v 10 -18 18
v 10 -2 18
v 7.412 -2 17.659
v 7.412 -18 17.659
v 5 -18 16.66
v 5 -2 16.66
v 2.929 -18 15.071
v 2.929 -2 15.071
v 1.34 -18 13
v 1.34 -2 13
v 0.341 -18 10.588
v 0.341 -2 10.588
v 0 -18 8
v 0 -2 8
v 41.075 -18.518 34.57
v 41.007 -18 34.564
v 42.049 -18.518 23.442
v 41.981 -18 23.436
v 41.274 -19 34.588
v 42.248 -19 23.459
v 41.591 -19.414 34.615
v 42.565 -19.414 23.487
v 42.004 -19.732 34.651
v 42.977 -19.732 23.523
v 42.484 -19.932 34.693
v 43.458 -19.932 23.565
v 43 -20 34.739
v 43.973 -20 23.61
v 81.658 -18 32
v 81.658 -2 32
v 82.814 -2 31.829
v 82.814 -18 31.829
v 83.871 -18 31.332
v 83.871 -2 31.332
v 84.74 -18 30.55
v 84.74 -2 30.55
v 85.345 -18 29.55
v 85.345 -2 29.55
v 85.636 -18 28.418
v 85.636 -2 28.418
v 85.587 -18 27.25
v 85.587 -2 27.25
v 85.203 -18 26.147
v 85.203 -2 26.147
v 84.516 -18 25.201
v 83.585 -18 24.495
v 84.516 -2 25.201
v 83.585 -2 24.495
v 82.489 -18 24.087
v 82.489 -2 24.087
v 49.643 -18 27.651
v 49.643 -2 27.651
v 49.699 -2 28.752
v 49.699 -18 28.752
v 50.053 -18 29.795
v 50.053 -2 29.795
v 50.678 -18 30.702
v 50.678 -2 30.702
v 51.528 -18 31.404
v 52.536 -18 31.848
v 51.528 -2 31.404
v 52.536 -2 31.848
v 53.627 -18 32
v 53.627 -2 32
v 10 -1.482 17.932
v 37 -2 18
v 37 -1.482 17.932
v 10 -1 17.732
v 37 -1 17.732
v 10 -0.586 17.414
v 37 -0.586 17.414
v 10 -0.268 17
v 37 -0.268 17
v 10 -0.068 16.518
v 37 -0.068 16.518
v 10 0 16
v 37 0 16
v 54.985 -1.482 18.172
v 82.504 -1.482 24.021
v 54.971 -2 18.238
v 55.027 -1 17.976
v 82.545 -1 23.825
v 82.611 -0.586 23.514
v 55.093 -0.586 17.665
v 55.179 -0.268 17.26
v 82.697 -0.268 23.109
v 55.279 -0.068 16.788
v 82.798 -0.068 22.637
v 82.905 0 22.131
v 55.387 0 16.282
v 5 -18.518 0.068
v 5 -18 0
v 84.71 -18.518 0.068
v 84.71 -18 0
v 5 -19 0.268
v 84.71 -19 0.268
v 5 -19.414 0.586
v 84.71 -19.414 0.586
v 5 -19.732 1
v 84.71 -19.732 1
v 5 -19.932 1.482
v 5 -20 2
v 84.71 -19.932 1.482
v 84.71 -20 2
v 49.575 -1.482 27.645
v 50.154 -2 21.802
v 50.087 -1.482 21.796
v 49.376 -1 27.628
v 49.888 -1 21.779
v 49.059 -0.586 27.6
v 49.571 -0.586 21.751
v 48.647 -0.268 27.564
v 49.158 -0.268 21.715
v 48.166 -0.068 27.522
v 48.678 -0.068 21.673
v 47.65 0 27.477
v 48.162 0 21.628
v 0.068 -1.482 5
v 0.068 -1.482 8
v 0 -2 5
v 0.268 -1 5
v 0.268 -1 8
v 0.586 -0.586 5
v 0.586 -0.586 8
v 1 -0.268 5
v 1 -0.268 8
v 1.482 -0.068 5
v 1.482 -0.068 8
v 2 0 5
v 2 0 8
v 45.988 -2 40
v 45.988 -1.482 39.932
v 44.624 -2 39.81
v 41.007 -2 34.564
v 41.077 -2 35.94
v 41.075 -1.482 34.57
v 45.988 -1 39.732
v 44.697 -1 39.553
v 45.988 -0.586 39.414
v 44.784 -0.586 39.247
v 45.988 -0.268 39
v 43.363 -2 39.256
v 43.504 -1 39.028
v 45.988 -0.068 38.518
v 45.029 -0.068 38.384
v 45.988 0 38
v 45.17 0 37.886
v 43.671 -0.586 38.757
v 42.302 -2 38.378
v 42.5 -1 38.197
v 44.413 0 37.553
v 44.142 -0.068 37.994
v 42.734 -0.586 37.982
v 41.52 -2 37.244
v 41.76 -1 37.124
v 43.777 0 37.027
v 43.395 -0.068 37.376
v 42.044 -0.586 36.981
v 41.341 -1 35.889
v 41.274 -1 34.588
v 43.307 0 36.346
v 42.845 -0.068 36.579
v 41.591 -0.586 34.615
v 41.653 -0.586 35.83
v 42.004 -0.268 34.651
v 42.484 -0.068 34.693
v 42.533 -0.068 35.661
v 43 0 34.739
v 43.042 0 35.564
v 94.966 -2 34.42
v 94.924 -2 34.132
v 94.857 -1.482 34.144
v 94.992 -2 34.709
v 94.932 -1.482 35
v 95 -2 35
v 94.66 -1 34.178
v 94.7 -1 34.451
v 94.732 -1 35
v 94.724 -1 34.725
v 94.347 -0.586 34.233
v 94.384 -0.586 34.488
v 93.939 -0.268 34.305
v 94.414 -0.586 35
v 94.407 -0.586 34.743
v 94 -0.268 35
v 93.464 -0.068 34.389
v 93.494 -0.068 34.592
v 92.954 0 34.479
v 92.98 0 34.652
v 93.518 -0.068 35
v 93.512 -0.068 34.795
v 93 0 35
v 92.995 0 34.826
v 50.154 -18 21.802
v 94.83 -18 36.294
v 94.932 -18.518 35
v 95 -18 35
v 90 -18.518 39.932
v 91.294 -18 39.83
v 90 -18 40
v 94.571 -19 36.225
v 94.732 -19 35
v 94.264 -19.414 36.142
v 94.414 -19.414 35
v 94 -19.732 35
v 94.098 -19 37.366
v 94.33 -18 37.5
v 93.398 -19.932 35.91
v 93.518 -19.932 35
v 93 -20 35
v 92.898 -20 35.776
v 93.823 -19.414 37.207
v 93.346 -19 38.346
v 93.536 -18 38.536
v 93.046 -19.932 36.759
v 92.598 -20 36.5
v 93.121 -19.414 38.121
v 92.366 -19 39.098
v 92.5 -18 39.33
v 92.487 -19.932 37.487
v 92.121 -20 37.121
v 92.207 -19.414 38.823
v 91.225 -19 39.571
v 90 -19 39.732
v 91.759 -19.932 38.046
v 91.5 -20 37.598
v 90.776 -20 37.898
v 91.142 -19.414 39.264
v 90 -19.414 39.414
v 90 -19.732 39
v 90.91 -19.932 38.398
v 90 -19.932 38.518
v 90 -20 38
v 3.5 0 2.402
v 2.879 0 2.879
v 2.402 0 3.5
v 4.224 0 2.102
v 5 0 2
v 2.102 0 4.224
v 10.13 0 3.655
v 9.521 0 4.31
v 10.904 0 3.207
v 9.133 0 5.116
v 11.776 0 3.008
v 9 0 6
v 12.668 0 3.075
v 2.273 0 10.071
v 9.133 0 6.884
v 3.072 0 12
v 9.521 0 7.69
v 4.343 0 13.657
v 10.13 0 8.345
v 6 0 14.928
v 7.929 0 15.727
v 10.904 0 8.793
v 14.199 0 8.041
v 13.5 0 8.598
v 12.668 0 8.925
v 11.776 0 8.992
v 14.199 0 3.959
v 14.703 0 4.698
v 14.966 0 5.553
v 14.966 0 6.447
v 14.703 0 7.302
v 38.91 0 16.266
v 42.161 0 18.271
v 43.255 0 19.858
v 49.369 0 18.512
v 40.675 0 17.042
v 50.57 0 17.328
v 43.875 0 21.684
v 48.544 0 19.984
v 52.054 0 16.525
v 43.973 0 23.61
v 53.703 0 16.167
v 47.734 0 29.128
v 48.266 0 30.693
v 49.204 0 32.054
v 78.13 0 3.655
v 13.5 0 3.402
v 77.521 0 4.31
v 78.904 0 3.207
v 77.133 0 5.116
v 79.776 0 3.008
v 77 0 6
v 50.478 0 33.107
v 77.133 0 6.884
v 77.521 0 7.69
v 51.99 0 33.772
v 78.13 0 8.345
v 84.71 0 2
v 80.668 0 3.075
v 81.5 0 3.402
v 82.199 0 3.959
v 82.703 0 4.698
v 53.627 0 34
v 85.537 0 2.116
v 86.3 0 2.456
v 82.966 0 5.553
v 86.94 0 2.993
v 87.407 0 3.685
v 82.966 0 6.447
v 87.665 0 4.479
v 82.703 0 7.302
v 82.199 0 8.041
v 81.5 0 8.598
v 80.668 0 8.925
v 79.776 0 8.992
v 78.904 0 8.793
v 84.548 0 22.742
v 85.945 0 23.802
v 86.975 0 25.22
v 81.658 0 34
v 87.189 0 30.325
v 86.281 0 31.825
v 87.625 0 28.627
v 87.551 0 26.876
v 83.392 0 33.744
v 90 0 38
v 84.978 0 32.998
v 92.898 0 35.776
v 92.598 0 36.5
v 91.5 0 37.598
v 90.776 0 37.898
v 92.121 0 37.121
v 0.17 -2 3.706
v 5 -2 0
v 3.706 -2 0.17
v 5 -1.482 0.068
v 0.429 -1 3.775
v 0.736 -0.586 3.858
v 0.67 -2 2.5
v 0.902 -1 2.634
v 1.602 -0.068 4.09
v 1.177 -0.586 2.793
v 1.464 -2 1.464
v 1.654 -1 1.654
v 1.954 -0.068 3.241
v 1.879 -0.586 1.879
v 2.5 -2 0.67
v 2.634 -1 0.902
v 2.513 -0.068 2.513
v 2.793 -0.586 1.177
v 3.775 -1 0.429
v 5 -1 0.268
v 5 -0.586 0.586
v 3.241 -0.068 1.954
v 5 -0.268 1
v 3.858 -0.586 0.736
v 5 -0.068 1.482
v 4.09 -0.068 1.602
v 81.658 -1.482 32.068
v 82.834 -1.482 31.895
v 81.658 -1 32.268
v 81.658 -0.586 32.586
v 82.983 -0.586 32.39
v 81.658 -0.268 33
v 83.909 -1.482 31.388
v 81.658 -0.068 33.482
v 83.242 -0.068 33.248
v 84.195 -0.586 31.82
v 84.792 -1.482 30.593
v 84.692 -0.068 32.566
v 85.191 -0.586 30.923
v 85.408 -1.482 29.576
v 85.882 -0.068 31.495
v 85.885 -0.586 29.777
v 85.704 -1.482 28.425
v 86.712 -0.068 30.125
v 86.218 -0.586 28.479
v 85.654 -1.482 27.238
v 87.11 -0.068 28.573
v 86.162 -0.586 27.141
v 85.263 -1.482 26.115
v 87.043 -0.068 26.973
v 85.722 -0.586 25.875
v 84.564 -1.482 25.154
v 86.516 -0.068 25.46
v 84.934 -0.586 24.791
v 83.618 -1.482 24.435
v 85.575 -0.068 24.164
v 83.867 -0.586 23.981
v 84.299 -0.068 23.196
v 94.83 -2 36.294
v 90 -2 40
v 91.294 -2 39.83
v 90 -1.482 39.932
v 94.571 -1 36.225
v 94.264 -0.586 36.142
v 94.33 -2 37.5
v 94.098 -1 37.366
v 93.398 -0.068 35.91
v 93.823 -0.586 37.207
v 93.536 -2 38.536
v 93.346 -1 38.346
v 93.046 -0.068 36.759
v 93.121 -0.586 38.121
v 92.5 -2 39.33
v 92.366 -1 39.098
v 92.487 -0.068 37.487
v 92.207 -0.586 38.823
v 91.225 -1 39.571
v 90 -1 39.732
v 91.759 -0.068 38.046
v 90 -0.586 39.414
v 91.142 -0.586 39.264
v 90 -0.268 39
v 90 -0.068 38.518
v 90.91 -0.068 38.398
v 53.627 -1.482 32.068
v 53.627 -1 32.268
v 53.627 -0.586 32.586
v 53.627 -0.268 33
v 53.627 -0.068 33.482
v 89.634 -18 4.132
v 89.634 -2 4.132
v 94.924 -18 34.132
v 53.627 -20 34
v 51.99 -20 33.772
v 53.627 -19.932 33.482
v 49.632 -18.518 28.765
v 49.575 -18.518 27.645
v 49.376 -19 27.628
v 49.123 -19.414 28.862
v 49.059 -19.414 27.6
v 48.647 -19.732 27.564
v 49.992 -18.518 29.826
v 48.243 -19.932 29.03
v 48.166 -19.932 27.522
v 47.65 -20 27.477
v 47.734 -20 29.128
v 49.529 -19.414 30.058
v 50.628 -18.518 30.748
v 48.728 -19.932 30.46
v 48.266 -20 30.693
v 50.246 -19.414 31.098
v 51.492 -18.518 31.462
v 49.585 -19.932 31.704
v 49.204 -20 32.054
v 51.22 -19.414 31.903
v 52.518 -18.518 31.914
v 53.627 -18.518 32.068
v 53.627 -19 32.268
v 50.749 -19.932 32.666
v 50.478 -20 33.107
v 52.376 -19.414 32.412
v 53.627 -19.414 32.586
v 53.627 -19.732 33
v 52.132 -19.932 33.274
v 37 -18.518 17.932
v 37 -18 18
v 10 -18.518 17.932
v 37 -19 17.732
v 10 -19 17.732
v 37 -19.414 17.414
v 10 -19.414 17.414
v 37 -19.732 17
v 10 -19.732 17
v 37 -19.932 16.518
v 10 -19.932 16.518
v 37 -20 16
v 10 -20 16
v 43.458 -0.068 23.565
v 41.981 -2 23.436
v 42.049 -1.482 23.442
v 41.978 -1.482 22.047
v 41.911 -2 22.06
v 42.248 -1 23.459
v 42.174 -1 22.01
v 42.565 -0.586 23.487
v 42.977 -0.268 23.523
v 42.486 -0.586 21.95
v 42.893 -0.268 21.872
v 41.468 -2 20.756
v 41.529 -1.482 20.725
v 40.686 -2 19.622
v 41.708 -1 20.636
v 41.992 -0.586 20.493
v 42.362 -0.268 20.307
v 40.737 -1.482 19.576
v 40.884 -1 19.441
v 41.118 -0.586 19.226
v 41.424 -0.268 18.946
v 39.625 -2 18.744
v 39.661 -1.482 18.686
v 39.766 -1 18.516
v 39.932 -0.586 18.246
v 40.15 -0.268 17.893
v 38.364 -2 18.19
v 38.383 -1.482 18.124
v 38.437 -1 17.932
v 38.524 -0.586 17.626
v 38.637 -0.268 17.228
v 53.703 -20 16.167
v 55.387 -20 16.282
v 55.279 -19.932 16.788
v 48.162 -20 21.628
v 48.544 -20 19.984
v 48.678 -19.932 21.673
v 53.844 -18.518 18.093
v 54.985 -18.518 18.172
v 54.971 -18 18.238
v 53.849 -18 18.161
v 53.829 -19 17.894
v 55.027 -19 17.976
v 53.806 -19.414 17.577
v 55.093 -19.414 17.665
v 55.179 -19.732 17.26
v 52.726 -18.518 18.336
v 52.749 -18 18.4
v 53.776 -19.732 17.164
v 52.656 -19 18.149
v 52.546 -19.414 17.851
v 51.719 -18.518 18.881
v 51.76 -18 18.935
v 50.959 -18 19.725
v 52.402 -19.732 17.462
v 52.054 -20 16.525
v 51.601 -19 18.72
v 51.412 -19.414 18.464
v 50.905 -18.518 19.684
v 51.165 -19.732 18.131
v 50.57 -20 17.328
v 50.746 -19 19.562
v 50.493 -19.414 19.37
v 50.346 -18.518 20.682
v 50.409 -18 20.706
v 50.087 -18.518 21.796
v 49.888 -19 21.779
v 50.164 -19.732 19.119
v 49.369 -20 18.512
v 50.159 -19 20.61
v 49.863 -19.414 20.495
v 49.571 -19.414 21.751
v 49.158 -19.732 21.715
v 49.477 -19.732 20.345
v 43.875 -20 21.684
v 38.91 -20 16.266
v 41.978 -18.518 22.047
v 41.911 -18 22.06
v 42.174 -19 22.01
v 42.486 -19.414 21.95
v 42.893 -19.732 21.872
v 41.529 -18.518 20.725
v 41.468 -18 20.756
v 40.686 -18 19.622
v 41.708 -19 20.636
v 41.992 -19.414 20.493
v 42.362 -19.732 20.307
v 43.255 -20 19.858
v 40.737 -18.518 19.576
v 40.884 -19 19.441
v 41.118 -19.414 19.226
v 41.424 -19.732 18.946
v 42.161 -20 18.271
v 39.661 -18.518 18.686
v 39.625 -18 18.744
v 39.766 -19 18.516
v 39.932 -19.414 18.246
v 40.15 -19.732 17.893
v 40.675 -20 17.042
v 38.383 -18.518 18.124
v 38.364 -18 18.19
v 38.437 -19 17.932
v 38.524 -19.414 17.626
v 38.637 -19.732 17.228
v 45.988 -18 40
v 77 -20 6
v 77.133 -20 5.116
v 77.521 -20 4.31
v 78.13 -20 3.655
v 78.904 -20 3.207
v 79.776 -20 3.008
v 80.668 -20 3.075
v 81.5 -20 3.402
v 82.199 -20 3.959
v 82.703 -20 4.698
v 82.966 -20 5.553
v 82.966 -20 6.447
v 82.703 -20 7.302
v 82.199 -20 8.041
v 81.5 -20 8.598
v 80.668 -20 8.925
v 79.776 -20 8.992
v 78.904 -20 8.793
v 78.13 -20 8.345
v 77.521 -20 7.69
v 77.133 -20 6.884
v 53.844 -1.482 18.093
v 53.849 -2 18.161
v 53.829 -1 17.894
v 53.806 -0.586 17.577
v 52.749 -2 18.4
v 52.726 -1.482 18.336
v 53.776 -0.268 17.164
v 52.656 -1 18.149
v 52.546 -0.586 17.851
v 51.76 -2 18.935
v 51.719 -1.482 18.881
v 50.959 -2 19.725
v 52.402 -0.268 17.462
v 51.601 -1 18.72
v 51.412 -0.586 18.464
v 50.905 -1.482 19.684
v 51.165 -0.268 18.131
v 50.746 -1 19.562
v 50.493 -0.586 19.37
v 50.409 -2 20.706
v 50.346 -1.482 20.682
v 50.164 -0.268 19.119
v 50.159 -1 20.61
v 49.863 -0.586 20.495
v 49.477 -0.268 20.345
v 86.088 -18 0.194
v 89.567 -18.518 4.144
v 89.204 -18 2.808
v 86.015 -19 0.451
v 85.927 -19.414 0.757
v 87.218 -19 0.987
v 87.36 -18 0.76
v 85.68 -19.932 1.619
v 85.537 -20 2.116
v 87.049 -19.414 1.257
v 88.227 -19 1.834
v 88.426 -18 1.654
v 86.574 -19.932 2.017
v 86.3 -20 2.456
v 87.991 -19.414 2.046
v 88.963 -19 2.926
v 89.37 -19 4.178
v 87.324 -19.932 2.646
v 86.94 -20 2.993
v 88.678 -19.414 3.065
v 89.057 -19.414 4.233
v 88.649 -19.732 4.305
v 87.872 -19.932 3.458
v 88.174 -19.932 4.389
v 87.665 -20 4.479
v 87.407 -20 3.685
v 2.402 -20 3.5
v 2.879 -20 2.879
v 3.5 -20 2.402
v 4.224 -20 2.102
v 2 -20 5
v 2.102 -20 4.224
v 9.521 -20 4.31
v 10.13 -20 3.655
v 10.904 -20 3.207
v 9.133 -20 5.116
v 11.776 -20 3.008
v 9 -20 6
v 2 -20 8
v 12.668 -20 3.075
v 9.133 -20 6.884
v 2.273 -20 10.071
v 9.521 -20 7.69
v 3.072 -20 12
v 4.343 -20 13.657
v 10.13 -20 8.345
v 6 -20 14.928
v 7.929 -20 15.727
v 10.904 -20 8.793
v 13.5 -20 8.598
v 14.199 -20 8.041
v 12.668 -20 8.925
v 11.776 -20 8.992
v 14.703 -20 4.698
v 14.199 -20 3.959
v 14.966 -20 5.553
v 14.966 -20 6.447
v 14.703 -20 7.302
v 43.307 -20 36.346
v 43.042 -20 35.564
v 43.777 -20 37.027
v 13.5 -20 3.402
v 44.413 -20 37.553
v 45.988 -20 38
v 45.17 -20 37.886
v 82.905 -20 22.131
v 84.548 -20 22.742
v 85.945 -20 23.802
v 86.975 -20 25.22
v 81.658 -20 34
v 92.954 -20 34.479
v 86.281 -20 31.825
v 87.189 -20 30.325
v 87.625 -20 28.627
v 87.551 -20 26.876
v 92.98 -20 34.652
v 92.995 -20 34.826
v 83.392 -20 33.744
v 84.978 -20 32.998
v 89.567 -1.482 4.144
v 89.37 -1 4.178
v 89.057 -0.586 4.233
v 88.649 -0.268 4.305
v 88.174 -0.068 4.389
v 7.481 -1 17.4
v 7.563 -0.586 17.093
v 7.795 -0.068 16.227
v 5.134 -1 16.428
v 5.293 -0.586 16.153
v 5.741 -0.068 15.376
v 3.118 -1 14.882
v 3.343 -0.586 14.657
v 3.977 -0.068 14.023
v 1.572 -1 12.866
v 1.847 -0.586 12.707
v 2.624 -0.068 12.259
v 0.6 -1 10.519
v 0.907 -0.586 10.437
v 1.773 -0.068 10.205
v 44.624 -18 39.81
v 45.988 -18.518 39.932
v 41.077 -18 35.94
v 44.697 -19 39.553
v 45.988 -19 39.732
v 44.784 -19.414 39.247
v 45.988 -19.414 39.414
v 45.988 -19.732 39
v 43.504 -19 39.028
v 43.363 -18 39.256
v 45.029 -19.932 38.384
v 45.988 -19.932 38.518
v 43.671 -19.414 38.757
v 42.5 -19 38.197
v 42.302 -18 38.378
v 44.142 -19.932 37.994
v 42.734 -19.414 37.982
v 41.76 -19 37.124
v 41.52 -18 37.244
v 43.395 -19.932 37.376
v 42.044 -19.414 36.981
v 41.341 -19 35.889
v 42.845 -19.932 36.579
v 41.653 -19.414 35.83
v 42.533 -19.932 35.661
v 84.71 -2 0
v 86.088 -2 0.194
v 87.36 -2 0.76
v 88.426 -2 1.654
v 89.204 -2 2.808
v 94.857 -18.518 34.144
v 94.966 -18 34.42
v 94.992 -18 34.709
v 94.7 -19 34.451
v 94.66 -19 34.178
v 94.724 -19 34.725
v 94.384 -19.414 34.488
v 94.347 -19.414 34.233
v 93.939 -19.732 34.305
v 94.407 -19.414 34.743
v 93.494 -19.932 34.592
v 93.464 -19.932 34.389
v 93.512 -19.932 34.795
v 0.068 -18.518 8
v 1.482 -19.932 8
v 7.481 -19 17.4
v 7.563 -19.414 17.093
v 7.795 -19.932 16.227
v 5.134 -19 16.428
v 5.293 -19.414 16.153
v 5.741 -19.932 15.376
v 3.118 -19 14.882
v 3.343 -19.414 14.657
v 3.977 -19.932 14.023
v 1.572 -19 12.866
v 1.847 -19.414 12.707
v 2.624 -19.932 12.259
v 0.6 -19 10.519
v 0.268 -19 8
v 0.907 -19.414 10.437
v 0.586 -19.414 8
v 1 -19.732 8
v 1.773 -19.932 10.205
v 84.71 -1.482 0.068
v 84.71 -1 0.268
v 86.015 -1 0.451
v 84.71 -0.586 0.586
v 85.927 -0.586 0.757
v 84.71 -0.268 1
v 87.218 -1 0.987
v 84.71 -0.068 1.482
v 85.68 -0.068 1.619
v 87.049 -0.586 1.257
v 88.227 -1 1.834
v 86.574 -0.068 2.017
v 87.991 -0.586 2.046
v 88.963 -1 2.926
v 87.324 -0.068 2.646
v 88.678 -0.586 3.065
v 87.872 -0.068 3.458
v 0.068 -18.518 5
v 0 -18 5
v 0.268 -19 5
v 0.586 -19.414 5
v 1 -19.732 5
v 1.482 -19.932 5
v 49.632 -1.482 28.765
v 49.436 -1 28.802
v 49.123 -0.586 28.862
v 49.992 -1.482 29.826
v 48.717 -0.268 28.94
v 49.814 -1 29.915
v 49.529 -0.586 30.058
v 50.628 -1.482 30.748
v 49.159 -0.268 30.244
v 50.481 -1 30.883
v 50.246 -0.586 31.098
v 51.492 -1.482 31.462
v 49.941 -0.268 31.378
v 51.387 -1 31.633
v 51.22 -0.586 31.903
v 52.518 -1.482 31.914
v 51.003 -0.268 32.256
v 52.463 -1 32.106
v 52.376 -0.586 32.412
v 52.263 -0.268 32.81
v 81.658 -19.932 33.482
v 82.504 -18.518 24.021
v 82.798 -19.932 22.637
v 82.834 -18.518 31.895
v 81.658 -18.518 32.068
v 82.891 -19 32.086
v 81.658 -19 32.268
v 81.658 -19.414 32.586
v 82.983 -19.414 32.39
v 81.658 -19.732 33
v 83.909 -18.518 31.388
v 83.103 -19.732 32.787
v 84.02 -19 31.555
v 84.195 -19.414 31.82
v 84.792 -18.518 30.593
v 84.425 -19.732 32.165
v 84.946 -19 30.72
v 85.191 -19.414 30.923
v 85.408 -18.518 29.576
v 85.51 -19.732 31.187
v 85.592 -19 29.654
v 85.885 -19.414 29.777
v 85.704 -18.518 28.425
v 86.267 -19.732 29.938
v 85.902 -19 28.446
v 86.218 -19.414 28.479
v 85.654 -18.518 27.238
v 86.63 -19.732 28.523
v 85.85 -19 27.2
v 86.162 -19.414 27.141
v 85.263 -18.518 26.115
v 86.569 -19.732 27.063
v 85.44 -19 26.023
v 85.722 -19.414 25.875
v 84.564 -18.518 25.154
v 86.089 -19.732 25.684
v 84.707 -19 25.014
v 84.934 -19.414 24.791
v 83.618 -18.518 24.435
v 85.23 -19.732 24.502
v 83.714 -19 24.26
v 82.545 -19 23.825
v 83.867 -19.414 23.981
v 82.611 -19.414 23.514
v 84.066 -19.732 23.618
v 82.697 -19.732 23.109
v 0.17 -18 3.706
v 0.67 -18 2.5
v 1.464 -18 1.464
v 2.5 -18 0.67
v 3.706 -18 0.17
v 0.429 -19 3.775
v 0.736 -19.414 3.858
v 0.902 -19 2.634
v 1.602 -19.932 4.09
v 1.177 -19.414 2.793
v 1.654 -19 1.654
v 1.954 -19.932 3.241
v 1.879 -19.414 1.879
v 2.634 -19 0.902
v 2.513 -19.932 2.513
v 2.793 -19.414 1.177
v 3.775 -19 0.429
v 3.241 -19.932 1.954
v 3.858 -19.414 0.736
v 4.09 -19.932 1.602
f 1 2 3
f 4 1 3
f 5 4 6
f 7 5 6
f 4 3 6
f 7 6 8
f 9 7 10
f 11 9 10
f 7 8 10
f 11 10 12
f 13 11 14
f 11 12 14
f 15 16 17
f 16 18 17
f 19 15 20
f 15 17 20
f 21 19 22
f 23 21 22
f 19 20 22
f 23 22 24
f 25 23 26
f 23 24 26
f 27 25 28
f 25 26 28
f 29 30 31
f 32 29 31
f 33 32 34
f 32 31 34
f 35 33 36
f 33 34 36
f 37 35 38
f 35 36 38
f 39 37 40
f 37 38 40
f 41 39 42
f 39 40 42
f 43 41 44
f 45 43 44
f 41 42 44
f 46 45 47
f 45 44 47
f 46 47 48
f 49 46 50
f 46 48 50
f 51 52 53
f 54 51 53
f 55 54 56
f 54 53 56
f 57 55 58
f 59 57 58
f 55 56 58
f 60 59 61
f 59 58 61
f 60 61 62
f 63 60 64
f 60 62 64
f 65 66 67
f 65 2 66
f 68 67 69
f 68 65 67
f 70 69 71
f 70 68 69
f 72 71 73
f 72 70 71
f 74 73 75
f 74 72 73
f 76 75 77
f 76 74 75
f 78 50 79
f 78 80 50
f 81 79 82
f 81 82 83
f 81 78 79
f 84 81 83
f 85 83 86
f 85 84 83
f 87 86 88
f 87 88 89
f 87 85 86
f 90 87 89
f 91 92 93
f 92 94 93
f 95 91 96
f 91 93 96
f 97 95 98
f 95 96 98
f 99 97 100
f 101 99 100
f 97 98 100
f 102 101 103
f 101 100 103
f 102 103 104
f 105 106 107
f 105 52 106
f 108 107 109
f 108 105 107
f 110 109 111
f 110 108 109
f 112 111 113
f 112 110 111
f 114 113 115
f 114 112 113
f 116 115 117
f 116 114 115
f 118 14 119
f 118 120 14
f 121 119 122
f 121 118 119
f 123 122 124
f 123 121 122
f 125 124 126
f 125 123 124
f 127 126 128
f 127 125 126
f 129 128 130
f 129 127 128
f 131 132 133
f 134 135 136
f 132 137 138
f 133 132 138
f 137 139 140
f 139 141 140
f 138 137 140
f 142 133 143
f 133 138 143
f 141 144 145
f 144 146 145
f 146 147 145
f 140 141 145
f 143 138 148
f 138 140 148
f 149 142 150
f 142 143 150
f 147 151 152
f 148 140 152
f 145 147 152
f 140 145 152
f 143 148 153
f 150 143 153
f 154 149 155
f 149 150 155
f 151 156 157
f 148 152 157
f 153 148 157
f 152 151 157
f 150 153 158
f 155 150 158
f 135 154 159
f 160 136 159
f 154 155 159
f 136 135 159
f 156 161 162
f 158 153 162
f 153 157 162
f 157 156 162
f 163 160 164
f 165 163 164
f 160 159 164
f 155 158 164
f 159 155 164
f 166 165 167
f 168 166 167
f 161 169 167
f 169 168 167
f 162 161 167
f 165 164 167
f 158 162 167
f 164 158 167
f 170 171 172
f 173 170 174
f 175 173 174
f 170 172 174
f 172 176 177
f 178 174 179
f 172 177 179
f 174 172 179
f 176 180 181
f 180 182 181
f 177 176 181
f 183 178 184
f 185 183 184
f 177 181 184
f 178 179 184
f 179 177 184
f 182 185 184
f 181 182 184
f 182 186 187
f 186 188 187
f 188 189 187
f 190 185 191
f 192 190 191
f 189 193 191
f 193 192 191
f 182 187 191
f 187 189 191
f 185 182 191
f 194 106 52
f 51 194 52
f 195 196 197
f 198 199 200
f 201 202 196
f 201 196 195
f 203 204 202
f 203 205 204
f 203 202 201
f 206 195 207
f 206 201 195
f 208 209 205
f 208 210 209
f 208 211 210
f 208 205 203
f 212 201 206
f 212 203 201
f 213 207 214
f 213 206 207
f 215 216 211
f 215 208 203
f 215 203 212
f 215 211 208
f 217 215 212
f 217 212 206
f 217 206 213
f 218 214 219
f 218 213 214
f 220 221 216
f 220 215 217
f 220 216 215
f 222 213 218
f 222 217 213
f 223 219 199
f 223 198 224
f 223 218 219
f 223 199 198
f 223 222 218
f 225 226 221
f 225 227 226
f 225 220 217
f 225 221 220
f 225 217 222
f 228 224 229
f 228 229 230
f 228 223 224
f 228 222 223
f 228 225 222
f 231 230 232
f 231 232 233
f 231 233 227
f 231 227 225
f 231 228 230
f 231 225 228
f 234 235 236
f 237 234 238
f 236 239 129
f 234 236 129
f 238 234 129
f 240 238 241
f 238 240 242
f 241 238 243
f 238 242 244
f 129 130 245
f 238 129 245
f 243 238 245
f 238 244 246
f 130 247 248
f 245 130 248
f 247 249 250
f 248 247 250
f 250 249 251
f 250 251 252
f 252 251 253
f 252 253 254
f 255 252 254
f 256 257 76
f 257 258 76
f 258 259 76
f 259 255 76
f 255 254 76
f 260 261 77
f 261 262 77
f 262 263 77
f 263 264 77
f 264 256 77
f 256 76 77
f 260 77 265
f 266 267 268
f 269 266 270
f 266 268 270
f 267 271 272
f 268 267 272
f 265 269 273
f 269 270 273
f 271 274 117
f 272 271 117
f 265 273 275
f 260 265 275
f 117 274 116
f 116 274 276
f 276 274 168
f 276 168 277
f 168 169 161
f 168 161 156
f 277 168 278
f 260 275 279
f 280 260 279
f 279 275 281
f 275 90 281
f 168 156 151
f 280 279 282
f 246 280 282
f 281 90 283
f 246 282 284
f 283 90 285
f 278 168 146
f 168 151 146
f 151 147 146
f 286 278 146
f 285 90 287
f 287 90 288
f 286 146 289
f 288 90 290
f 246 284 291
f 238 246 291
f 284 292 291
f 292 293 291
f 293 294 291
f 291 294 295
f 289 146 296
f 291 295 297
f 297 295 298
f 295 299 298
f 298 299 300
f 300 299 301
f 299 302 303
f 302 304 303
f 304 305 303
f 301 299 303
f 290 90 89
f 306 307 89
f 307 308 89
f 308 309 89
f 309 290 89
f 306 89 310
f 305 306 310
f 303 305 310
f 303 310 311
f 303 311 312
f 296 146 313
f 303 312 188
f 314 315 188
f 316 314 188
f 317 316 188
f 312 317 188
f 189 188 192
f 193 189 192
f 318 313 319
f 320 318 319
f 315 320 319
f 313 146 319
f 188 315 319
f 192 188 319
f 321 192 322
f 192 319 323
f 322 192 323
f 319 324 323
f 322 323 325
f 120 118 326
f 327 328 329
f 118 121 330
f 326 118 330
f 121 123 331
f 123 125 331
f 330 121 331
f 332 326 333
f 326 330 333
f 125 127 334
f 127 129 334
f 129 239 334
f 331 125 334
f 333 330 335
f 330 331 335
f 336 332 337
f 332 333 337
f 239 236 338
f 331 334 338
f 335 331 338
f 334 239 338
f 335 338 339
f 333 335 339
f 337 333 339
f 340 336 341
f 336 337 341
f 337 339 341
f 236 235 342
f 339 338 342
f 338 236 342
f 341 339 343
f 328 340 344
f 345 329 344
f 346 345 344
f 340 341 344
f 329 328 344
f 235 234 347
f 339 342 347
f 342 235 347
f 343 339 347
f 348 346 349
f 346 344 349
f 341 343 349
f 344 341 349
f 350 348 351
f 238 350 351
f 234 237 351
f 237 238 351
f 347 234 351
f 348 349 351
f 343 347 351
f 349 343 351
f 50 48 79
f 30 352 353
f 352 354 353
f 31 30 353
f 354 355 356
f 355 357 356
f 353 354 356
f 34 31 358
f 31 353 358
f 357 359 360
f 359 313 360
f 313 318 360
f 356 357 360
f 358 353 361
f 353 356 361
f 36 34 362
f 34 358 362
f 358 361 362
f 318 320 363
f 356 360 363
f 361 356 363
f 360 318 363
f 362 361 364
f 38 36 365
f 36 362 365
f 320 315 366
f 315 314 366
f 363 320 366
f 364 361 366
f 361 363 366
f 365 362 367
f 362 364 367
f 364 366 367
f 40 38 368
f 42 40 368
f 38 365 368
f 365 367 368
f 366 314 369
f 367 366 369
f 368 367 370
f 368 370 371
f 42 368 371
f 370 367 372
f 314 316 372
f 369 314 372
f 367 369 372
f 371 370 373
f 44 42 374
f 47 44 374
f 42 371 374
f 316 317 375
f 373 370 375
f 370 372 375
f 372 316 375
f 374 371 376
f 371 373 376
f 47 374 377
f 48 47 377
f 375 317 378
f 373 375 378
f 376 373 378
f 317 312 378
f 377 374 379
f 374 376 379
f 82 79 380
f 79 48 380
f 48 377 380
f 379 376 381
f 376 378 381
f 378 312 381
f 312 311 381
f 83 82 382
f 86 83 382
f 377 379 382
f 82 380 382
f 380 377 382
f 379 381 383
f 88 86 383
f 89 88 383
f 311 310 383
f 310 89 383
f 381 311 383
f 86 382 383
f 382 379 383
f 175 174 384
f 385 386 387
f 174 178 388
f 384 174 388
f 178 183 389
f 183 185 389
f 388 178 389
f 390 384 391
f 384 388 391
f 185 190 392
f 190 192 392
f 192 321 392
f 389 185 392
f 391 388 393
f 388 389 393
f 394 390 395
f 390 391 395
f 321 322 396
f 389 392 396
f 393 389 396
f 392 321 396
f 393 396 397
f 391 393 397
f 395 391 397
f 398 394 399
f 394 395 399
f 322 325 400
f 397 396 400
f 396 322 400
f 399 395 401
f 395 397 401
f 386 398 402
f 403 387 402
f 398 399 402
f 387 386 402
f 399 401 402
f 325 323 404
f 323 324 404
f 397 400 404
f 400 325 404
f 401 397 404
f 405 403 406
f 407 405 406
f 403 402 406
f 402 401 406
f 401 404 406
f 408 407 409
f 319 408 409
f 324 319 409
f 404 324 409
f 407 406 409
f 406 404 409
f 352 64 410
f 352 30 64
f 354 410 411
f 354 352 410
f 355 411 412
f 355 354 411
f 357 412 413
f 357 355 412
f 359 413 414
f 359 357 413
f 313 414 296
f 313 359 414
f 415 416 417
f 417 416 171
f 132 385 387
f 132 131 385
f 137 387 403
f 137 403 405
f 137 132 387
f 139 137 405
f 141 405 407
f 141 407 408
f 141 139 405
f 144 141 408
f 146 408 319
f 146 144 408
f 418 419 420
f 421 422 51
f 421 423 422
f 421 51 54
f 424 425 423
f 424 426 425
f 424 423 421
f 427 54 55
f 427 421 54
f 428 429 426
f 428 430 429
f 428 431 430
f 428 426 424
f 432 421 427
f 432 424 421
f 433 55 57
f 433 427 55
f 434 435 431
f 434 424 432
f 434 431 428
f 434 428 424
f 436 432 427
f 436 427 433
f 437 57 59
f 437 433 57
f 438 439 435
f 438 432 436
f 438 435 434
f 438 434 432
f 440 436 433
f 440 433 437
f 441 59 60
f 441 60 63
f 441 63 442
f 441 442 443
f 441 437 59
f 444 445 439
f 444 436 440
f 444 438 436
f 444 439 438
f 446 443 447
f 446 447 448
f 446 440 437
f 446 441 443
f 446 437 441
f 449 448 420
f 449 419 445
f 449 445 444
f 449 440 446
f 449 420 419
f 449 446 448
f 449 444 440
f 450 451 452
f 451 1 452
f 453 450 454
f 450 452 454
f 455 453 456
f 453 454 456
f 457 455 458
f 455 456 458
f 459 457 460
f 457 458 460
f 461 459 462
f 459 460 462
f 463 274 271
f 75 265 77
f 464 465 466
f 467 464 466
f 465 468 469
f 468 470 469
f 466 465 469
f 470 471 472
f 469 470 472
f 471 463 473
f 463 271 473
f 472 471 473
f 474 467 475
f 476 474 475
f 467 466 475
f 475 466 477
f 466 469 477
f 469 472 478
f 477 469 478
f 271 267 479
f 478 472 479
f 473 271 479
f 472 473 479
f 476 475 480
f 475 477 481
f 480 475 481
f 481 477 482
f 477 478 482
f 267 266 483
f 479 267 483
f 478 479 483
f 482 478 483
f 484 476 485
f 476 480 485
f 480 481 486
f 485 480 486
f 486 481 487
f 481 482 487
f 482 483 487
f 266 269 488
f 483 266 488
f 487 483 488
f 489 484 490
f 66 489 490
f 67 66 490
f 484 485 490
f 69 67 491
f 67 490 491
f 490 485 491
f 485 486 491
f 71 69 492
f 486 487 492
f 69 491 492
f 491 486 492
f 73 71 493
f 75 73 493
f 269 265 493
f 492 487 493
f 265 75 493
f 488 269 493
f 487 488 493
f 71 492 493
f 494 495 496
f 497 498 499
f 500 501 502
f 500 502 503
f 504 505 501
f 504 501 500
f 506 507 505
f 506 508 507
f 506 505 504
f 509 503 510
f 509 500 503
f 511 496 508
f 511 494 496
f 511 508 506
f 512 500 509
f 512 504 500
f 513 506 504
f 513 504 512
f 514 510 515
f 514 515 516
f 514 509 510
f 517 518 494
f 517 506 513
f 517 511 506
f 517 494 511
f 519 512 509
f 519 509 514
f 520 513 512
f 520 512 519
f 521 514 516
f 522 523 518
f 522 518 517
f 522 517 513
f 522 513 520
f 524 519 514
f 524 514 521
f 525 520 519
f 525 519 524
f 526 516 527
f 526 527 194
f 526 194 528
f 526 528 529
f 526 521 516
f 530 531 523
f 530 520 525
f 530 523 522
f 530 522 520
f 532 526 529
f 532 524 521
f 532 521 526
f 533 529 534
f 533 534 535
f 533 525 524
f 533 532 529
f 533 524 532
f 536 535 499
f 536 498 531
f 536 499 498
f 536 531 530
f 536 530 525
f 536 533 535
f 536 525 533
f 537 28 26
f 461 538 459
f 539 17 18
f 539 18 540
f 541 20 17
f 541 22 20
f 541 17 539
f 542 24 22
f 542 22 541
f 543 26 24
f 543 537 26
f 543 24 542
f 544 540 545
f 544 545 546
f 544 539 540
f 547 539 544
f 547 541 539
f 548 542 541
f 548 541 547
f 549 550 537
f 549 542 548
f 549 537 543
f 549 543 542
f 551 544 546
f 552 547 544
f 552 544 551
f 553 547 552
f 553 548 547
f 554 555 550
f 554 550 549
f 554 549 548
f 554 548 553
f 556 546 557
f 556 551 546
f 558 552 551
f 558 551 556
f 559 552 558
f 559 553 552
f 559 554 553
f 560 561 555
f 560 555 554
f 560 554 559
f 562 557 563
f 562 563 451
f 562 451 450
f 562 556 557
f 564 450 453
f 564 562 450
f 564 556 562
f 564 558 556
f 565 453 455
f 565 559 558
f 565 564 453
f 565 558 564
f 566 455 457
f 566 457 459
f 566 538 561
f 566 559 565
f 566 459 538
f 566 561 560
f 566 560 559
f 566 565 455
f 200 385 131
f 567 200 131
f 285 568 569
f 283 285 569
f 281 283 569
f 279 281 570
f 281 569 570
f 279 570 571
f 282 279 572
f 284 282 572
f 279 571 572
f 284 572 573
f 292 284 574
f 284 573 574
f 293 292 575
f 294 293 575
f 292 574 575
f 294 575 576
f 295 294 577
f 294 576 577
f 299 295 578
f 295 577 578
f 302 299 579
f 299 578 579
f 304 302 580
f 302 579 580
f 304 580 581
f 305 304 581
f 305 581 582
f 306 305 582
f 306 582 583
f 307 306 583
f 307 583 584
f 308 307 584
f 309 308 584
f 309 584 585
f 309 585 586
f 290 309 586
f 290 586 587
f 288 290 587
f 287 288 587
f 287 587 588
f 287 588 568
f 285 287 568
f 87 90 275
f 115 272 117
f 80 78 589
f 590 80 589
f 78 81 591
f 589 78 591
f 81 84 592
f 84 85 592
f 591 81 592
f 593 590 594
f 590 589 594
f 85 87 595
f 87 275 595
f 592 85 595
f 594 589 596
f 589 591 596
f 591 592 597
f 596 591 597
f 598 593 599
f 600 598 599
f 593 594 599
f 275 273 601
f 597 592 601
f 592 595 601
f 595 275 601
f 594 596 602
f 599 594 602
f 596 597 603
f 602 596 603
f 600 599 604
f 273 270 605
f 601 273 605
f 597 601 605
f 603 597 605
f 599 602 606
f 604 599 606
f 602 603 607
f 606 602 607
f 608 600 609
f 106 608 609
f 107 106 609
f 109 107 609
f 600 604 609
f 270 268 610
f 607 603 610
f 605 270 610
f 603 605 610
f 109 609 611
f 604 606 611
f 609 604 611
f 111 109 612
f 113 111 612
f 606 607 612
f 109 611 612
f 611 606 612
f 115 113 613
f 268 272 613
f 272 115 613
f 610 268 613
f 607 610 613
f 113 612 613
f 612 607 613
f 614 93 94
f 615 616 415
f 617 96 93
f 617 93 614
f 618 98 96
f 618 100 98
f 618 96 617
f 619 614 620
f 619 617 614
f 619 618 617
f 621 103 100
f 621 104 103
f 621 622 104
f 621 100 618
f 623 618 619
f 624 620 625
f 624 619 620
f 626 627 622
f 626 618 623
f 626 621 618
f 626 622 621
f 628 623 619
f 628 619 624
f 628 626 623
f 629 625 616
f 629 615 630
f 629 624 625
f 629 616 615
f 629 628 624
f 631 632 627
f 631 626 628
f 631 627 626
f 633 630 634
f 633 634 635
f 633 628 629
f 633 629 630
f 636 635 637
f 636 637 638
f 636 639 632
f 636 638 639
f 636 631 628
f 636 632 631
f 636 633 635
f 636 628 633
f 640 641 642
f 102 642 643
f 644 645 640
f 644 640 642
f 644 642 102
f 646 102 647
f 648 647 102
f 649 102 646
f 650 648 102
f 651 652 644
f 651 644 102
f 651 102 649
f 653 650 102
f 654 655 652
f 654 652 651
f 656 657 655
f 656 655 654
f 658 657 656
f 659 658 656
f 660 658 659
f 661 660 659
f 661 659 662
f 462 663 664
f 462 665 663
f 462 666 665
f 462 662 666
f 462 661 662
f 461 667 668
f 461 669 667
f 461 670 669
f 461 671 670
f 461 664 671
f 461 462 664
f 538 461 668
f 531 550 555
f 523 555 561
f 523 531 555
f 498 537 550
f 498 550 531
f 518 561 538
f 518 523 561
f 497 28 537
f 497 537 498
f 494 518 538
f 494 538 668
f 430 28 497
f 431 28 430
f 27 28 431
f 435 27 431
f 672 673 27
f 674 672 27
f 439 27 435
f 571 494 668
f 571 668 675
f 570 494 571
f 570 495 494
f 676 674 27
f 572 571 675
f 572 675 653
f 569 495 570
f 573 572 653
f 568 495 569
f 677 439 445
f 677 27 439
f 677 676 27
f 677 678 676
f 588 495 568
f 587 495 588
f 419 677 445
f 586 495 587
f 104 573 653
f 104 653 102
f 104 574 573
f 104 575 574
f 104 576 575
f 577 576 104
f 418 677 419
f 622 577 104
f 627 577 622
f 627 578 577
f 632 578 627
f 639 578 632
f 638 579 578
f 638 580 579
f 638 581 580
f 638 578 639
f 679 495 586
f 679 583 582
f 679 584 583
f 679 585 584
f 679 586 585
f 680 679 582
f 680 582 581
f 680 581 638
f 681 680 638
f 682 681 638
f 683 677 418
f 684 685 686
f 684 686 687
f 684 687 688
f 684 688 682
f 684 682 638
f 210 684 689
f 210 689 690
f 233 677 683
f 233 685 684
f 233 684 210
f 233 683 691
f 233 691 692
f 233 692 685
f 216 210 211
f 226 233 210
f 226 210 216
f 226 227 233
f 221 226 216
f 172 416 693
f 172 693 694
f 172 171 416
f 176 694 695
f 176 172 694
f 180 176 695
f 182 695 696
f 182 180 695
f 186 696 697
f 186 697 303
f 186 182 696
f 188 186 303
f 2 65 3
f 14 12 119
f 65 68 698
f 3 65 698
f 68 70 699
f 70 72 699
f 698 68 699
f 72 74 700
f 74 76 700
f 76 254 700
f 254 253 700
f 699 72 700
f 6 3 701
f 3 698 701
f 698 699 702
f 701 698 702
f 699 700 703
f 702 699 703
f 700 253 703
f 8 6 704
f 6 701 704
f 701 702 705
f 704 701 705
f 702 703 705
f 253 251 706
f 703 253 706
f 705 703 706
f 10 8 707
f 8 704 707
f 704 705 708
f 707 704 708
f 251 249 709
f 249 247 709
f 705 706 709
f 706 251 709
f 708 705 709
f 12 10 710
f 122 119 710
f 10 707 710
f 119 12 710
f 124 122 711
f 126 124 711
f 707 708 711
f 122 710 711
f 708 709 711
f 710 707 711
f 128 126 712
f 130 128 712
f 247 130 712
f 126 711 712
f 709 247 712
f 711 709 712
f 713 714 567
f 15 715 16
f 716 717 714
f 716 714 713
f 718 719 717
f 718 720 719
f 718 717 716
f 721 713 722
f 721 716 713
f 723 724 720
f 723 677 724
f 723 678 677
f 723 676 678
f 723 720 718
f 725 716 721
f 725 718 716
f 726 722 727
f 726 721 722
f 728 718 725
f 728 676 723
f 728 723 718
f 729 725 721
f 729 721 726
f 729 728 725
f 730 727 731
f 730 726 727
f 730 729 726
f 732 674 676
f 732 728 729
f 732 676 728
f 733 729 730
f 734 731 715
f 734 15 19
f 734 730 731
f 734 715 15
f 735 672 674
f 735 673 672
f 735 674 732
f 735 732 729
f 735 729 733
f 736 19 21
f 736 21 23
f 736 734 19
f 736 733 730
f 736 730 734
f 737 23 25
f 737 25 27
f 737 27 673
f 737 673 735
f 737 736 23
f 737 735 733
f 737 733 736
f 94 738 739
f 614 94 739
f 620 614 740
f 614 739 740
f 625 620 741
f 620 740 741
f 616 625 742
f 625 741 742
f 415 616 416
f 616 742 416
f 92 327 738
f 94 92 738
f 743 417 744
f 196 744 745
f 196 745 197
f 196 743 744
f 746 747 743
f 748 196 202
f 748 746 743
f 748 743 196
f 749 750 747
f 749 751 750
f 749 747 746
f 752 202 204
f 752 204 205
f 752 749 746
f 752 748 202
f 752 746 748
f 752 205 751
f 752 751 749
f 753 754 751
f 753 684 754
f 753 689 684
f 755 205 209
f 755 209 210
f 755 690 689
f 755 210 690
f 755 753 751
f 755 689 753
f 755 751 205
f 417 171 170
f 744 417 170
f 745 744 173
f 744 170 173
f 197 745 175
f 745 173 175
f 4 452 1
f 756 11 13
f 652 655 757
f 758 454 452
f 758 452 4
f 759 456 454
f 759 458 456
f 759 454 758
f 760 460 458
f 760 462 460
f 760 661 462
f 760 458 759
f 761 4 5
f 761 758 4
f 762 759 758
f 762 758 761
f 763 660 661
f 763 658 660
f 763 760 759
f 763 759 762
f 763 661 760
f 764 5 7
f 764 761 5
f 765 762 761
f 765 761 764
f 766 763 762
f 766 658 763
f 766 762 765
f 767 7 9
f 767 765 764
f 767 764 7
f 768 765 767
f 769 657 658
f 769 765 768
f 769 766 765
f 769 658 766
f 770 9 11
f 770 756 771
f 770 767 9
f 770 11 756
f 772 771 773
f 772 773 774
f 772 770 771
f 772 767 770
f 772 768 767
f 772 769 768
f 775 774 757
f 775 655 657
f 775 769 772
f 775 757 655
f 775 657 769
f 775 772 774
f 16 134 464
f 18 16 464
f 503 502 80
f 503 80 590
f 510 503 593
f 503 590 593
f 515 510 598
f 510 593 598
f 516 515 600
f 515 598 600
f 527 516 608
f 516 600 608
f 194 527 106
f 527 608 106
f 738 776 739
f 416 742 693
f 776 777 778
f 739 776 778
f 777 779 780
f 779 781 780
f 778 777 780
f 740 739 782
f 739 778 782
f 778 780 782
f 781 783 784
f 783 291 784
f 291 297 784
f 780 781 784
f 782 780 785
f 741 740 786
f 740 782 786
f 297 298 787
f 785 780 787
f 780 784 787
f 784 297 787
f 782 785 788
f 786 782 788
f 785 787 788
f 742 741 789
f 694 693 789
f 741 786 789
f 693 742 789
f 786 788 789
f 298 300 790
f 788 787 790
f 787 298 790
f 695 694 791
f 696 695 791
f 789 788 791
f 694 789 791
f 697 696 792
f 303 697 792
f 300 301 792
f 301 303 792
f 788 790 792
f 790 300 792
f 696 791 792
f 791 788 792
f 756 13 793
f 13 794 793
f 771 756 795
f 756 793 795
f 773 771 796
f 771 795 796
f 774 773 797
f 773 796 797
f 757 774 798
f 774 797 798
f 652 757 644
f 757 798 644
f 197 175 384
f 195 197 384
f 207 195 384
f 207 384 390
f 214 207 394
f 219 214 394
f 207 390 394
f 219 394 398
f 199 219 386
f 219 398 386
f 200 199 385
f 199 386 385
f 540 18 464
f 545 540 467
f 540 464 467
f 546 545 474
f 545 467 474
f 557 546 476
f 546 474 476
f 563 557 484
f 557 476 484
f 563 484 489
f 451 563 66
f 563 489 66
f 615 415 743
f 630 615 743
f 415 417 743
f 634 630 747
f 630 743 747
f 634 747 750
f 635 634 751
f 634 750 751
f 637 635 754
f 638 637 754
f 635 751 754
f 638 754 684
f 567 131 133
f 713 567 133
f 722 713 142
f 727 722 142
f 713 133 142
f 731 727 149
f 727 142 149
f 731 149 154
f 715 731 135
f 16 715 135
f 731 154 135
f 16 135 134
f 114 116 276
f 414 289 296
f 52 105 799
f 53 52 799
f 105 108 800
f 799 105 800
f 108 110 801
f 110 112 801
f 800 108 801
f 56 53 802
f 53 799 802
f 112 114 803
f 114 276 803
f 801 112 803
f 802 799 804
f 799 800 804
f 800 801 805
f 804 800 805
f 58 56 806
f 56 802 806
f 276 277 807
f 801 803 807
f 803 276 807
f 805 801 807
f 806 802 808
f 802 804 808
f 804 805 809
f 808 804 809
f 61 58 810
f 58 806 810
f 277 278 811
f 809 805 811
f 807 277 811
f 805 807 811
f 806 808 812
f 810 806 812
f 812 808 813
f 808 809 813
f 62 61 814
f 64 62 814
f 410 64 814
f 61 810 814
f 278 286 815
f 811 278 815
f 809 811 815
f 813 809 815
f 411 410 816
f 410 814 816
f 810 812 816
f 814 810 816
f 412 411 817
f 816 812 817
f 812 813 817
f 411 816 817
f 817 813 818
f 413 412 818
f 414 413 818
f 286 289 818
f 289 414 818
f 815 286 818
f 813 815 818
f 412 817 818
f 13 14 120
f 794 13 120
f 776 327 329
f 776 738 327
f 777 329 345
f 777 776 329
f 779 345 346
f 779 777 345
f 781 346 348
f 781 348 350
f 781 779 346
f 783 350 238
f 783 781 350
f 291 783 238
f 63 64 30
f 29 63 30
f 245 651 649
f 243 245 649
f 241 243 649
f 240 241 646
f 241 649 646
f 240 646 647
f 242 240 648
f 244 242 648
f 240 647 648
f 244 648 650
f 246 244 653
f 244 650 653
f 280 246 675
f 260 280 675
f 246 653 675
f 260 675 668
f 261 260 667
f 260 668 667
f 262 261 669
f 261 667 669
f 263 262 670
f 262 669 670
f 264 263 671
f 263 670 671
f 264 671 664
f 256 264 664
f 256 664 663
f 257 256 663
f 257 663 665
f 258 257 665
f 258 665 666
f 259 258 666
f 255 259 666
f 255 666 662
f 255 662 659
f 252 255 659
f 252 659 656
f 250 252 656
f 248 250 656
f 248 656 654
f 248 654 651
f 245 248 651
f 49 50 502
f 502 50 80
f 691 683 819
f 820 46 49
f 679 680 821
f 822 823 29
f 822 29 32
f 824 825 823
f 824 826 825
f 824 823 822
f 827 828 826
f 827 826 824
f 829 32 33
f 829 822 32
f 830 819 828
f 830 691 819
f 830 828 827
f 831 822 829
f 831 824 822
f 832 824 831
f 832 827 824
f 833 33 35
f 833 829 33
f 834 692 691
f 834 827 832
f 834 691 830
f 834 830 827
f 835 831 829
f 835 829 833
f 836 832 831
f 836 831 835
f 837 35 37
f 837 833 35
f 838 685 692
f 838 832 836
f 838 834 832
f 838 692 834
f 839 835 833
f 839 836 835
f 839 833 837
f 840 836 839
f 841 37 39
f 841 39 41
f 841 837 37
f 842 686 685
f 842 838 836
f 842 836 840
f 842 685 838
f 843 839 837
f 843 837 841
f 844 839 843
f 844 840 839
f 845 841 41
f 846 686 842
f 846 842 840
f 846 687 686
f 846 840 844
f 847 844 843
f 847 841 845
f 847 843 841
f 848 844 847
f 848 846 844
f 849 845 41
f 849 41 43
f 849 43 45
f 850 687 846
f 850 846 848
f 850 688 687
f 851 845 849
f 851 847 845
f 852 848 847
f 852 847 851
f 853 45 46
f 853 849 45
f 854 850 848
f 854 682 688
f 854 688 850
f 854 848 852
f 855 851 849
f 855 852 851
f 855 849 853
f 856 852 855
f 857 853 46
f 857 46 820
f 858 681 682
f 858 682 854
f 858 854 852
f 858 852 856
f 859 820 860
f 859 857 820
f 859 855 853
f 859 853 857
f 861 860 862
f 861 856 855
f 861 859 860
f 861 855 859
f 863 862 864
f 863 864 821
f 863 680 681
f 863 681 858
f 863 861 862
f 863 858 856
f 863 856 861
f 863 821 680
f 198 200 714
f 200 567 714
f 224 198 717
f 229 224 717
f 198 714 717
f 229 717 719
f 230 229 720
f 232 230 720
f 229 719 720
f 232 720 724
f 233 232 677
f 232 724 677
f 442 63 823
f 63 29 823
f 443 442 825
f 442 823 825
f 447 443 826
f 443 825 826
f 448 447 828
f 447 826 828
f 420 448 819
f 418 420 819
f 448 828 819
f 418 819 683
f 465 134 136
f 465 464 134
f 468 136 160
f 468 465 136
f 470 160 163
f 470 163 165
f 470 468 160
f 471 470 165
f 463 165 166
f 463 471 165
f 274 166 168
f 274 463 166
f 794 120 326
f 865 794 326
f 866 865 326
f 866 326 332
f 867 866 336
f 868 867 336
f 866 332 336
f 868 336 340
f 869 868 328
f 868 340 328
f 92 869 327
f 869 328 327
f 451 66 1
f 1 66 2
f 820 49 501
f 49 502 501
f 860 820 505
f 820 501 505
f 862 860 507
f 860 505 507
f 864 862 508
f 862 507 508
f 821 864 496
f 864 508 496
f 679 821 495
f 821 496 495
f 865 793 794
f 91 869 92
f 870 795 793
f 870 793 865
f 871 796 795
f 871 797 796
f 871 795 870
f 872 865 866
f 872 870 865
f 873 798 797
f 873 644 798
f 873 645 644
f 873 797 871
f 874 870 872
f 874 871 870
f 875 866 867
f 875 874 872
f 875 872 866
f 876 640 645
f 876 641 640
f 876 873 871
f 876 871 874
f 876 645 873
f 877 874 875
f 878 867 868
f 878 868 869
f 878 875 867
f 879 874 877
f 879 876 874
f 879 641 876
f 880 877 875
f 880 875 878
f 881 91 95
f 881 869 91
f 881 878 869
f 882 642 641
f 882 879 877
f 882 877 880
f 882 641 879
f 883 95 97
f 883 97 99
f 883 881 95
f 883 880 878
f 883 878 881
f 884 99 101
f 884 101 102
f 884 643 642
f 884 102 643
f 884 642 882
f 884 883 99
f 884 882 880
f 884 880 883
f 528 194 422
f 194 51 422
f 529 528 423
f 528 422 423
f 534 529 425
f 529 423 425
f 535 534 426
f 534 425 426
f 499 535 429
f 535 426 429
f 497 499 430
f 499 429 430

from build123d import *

# Parameters (mm, degrees)
F1_DEPTH = 20
F2_R     = 2
F4_D     = 6


with BuildPart() as f1:
    # F0 (on Front) → F1 (new body)
    with BuildSketch(Plane.XZ):
        with BuildLine():
            ThreePointArc((0, 5), (1.4644660941, 1.4644660941), (5, 0))
            Line((5, 0), (84.7101905787, 0))
            ThreePointArc((84.7101905787, 0), (87.9241286272, 1.1697777844), (89.6342293438, 4.1317591117))
            Line((89.6342293438, 4.1317591117), (94.9240387651, 34.1317591117))
            ThreePointArc((94.9240387651, 34.1317591117), (94.9809734905, 34.5642212863), (95, 35))
            ThreePointArc((95, 35), (93.5355339059, 38.5355339059), (90, 40))
            Line((90, 40), (45.9883344131, 40))
            ThreePointArc((45.9883344131, 40), (42.3019477291, 38.3779510381), (41.0073609227, 34.5642212863))
            Line((41.0073609227, 34.5642212863), (41.9809734905, 23.4357787137))
            ThreePointArc((41.9809734905, 23.4357787137), (40.6863866841, 19.6220489619), (37, 18))
            Line((37, 18), (10, 18))
            ThreePointArc((10, 18), (2.9289321881, 15.0710678119), (0, 8))
            Line((0, 8), (0, 5))
        make_face()
        with BuildLine():
            ThreePointArc((49.6427151282, 27.651377029), (50.6783845734, 30.7023608305), (53.6274939206, 32))
            Line((53.6274939206, 32), (81.6577248518, 32))
            ThreePointArc((81.6577248518, 32), (85.6358124333, 28.4181138531), (82.4893716151, 24.0874095971))
            Line((82.4893716151, 24.0874095971), (54.9708824747, 18.238174163))
            ThreePointArc((54.9708824747, 18.238174163), (51.7599445644, 18.9353371235), (50.154456919, 21.802141595))
            Line((50.154456919, 21.802141595), (49.6427151282, 27.651377029))
        make_face(mode=Mode.SUBTRACT)
    extrude(amount=F1_DEPTH)

    # F2
    f2_edges = [f1.edges().sort_by_distance(p)[0] for p in [
        (67.642609, -20, 32),
        (41.494167, -20, 29),
        (68.730127, 0, 21.162792),
        (41.494167, 0, 29),
    ]]
    fillet(f2_edges, radius=F2_R)

    # F4 (through all)
    with Locations(Plane(origin=(0, 0, 0), x_dir=(1, 0, 0), z_dir=(0, 1, 0))):
        with Locations((12, -6), (80, -6)):
            Hole(F4_D / 2)


solid = f1.part
